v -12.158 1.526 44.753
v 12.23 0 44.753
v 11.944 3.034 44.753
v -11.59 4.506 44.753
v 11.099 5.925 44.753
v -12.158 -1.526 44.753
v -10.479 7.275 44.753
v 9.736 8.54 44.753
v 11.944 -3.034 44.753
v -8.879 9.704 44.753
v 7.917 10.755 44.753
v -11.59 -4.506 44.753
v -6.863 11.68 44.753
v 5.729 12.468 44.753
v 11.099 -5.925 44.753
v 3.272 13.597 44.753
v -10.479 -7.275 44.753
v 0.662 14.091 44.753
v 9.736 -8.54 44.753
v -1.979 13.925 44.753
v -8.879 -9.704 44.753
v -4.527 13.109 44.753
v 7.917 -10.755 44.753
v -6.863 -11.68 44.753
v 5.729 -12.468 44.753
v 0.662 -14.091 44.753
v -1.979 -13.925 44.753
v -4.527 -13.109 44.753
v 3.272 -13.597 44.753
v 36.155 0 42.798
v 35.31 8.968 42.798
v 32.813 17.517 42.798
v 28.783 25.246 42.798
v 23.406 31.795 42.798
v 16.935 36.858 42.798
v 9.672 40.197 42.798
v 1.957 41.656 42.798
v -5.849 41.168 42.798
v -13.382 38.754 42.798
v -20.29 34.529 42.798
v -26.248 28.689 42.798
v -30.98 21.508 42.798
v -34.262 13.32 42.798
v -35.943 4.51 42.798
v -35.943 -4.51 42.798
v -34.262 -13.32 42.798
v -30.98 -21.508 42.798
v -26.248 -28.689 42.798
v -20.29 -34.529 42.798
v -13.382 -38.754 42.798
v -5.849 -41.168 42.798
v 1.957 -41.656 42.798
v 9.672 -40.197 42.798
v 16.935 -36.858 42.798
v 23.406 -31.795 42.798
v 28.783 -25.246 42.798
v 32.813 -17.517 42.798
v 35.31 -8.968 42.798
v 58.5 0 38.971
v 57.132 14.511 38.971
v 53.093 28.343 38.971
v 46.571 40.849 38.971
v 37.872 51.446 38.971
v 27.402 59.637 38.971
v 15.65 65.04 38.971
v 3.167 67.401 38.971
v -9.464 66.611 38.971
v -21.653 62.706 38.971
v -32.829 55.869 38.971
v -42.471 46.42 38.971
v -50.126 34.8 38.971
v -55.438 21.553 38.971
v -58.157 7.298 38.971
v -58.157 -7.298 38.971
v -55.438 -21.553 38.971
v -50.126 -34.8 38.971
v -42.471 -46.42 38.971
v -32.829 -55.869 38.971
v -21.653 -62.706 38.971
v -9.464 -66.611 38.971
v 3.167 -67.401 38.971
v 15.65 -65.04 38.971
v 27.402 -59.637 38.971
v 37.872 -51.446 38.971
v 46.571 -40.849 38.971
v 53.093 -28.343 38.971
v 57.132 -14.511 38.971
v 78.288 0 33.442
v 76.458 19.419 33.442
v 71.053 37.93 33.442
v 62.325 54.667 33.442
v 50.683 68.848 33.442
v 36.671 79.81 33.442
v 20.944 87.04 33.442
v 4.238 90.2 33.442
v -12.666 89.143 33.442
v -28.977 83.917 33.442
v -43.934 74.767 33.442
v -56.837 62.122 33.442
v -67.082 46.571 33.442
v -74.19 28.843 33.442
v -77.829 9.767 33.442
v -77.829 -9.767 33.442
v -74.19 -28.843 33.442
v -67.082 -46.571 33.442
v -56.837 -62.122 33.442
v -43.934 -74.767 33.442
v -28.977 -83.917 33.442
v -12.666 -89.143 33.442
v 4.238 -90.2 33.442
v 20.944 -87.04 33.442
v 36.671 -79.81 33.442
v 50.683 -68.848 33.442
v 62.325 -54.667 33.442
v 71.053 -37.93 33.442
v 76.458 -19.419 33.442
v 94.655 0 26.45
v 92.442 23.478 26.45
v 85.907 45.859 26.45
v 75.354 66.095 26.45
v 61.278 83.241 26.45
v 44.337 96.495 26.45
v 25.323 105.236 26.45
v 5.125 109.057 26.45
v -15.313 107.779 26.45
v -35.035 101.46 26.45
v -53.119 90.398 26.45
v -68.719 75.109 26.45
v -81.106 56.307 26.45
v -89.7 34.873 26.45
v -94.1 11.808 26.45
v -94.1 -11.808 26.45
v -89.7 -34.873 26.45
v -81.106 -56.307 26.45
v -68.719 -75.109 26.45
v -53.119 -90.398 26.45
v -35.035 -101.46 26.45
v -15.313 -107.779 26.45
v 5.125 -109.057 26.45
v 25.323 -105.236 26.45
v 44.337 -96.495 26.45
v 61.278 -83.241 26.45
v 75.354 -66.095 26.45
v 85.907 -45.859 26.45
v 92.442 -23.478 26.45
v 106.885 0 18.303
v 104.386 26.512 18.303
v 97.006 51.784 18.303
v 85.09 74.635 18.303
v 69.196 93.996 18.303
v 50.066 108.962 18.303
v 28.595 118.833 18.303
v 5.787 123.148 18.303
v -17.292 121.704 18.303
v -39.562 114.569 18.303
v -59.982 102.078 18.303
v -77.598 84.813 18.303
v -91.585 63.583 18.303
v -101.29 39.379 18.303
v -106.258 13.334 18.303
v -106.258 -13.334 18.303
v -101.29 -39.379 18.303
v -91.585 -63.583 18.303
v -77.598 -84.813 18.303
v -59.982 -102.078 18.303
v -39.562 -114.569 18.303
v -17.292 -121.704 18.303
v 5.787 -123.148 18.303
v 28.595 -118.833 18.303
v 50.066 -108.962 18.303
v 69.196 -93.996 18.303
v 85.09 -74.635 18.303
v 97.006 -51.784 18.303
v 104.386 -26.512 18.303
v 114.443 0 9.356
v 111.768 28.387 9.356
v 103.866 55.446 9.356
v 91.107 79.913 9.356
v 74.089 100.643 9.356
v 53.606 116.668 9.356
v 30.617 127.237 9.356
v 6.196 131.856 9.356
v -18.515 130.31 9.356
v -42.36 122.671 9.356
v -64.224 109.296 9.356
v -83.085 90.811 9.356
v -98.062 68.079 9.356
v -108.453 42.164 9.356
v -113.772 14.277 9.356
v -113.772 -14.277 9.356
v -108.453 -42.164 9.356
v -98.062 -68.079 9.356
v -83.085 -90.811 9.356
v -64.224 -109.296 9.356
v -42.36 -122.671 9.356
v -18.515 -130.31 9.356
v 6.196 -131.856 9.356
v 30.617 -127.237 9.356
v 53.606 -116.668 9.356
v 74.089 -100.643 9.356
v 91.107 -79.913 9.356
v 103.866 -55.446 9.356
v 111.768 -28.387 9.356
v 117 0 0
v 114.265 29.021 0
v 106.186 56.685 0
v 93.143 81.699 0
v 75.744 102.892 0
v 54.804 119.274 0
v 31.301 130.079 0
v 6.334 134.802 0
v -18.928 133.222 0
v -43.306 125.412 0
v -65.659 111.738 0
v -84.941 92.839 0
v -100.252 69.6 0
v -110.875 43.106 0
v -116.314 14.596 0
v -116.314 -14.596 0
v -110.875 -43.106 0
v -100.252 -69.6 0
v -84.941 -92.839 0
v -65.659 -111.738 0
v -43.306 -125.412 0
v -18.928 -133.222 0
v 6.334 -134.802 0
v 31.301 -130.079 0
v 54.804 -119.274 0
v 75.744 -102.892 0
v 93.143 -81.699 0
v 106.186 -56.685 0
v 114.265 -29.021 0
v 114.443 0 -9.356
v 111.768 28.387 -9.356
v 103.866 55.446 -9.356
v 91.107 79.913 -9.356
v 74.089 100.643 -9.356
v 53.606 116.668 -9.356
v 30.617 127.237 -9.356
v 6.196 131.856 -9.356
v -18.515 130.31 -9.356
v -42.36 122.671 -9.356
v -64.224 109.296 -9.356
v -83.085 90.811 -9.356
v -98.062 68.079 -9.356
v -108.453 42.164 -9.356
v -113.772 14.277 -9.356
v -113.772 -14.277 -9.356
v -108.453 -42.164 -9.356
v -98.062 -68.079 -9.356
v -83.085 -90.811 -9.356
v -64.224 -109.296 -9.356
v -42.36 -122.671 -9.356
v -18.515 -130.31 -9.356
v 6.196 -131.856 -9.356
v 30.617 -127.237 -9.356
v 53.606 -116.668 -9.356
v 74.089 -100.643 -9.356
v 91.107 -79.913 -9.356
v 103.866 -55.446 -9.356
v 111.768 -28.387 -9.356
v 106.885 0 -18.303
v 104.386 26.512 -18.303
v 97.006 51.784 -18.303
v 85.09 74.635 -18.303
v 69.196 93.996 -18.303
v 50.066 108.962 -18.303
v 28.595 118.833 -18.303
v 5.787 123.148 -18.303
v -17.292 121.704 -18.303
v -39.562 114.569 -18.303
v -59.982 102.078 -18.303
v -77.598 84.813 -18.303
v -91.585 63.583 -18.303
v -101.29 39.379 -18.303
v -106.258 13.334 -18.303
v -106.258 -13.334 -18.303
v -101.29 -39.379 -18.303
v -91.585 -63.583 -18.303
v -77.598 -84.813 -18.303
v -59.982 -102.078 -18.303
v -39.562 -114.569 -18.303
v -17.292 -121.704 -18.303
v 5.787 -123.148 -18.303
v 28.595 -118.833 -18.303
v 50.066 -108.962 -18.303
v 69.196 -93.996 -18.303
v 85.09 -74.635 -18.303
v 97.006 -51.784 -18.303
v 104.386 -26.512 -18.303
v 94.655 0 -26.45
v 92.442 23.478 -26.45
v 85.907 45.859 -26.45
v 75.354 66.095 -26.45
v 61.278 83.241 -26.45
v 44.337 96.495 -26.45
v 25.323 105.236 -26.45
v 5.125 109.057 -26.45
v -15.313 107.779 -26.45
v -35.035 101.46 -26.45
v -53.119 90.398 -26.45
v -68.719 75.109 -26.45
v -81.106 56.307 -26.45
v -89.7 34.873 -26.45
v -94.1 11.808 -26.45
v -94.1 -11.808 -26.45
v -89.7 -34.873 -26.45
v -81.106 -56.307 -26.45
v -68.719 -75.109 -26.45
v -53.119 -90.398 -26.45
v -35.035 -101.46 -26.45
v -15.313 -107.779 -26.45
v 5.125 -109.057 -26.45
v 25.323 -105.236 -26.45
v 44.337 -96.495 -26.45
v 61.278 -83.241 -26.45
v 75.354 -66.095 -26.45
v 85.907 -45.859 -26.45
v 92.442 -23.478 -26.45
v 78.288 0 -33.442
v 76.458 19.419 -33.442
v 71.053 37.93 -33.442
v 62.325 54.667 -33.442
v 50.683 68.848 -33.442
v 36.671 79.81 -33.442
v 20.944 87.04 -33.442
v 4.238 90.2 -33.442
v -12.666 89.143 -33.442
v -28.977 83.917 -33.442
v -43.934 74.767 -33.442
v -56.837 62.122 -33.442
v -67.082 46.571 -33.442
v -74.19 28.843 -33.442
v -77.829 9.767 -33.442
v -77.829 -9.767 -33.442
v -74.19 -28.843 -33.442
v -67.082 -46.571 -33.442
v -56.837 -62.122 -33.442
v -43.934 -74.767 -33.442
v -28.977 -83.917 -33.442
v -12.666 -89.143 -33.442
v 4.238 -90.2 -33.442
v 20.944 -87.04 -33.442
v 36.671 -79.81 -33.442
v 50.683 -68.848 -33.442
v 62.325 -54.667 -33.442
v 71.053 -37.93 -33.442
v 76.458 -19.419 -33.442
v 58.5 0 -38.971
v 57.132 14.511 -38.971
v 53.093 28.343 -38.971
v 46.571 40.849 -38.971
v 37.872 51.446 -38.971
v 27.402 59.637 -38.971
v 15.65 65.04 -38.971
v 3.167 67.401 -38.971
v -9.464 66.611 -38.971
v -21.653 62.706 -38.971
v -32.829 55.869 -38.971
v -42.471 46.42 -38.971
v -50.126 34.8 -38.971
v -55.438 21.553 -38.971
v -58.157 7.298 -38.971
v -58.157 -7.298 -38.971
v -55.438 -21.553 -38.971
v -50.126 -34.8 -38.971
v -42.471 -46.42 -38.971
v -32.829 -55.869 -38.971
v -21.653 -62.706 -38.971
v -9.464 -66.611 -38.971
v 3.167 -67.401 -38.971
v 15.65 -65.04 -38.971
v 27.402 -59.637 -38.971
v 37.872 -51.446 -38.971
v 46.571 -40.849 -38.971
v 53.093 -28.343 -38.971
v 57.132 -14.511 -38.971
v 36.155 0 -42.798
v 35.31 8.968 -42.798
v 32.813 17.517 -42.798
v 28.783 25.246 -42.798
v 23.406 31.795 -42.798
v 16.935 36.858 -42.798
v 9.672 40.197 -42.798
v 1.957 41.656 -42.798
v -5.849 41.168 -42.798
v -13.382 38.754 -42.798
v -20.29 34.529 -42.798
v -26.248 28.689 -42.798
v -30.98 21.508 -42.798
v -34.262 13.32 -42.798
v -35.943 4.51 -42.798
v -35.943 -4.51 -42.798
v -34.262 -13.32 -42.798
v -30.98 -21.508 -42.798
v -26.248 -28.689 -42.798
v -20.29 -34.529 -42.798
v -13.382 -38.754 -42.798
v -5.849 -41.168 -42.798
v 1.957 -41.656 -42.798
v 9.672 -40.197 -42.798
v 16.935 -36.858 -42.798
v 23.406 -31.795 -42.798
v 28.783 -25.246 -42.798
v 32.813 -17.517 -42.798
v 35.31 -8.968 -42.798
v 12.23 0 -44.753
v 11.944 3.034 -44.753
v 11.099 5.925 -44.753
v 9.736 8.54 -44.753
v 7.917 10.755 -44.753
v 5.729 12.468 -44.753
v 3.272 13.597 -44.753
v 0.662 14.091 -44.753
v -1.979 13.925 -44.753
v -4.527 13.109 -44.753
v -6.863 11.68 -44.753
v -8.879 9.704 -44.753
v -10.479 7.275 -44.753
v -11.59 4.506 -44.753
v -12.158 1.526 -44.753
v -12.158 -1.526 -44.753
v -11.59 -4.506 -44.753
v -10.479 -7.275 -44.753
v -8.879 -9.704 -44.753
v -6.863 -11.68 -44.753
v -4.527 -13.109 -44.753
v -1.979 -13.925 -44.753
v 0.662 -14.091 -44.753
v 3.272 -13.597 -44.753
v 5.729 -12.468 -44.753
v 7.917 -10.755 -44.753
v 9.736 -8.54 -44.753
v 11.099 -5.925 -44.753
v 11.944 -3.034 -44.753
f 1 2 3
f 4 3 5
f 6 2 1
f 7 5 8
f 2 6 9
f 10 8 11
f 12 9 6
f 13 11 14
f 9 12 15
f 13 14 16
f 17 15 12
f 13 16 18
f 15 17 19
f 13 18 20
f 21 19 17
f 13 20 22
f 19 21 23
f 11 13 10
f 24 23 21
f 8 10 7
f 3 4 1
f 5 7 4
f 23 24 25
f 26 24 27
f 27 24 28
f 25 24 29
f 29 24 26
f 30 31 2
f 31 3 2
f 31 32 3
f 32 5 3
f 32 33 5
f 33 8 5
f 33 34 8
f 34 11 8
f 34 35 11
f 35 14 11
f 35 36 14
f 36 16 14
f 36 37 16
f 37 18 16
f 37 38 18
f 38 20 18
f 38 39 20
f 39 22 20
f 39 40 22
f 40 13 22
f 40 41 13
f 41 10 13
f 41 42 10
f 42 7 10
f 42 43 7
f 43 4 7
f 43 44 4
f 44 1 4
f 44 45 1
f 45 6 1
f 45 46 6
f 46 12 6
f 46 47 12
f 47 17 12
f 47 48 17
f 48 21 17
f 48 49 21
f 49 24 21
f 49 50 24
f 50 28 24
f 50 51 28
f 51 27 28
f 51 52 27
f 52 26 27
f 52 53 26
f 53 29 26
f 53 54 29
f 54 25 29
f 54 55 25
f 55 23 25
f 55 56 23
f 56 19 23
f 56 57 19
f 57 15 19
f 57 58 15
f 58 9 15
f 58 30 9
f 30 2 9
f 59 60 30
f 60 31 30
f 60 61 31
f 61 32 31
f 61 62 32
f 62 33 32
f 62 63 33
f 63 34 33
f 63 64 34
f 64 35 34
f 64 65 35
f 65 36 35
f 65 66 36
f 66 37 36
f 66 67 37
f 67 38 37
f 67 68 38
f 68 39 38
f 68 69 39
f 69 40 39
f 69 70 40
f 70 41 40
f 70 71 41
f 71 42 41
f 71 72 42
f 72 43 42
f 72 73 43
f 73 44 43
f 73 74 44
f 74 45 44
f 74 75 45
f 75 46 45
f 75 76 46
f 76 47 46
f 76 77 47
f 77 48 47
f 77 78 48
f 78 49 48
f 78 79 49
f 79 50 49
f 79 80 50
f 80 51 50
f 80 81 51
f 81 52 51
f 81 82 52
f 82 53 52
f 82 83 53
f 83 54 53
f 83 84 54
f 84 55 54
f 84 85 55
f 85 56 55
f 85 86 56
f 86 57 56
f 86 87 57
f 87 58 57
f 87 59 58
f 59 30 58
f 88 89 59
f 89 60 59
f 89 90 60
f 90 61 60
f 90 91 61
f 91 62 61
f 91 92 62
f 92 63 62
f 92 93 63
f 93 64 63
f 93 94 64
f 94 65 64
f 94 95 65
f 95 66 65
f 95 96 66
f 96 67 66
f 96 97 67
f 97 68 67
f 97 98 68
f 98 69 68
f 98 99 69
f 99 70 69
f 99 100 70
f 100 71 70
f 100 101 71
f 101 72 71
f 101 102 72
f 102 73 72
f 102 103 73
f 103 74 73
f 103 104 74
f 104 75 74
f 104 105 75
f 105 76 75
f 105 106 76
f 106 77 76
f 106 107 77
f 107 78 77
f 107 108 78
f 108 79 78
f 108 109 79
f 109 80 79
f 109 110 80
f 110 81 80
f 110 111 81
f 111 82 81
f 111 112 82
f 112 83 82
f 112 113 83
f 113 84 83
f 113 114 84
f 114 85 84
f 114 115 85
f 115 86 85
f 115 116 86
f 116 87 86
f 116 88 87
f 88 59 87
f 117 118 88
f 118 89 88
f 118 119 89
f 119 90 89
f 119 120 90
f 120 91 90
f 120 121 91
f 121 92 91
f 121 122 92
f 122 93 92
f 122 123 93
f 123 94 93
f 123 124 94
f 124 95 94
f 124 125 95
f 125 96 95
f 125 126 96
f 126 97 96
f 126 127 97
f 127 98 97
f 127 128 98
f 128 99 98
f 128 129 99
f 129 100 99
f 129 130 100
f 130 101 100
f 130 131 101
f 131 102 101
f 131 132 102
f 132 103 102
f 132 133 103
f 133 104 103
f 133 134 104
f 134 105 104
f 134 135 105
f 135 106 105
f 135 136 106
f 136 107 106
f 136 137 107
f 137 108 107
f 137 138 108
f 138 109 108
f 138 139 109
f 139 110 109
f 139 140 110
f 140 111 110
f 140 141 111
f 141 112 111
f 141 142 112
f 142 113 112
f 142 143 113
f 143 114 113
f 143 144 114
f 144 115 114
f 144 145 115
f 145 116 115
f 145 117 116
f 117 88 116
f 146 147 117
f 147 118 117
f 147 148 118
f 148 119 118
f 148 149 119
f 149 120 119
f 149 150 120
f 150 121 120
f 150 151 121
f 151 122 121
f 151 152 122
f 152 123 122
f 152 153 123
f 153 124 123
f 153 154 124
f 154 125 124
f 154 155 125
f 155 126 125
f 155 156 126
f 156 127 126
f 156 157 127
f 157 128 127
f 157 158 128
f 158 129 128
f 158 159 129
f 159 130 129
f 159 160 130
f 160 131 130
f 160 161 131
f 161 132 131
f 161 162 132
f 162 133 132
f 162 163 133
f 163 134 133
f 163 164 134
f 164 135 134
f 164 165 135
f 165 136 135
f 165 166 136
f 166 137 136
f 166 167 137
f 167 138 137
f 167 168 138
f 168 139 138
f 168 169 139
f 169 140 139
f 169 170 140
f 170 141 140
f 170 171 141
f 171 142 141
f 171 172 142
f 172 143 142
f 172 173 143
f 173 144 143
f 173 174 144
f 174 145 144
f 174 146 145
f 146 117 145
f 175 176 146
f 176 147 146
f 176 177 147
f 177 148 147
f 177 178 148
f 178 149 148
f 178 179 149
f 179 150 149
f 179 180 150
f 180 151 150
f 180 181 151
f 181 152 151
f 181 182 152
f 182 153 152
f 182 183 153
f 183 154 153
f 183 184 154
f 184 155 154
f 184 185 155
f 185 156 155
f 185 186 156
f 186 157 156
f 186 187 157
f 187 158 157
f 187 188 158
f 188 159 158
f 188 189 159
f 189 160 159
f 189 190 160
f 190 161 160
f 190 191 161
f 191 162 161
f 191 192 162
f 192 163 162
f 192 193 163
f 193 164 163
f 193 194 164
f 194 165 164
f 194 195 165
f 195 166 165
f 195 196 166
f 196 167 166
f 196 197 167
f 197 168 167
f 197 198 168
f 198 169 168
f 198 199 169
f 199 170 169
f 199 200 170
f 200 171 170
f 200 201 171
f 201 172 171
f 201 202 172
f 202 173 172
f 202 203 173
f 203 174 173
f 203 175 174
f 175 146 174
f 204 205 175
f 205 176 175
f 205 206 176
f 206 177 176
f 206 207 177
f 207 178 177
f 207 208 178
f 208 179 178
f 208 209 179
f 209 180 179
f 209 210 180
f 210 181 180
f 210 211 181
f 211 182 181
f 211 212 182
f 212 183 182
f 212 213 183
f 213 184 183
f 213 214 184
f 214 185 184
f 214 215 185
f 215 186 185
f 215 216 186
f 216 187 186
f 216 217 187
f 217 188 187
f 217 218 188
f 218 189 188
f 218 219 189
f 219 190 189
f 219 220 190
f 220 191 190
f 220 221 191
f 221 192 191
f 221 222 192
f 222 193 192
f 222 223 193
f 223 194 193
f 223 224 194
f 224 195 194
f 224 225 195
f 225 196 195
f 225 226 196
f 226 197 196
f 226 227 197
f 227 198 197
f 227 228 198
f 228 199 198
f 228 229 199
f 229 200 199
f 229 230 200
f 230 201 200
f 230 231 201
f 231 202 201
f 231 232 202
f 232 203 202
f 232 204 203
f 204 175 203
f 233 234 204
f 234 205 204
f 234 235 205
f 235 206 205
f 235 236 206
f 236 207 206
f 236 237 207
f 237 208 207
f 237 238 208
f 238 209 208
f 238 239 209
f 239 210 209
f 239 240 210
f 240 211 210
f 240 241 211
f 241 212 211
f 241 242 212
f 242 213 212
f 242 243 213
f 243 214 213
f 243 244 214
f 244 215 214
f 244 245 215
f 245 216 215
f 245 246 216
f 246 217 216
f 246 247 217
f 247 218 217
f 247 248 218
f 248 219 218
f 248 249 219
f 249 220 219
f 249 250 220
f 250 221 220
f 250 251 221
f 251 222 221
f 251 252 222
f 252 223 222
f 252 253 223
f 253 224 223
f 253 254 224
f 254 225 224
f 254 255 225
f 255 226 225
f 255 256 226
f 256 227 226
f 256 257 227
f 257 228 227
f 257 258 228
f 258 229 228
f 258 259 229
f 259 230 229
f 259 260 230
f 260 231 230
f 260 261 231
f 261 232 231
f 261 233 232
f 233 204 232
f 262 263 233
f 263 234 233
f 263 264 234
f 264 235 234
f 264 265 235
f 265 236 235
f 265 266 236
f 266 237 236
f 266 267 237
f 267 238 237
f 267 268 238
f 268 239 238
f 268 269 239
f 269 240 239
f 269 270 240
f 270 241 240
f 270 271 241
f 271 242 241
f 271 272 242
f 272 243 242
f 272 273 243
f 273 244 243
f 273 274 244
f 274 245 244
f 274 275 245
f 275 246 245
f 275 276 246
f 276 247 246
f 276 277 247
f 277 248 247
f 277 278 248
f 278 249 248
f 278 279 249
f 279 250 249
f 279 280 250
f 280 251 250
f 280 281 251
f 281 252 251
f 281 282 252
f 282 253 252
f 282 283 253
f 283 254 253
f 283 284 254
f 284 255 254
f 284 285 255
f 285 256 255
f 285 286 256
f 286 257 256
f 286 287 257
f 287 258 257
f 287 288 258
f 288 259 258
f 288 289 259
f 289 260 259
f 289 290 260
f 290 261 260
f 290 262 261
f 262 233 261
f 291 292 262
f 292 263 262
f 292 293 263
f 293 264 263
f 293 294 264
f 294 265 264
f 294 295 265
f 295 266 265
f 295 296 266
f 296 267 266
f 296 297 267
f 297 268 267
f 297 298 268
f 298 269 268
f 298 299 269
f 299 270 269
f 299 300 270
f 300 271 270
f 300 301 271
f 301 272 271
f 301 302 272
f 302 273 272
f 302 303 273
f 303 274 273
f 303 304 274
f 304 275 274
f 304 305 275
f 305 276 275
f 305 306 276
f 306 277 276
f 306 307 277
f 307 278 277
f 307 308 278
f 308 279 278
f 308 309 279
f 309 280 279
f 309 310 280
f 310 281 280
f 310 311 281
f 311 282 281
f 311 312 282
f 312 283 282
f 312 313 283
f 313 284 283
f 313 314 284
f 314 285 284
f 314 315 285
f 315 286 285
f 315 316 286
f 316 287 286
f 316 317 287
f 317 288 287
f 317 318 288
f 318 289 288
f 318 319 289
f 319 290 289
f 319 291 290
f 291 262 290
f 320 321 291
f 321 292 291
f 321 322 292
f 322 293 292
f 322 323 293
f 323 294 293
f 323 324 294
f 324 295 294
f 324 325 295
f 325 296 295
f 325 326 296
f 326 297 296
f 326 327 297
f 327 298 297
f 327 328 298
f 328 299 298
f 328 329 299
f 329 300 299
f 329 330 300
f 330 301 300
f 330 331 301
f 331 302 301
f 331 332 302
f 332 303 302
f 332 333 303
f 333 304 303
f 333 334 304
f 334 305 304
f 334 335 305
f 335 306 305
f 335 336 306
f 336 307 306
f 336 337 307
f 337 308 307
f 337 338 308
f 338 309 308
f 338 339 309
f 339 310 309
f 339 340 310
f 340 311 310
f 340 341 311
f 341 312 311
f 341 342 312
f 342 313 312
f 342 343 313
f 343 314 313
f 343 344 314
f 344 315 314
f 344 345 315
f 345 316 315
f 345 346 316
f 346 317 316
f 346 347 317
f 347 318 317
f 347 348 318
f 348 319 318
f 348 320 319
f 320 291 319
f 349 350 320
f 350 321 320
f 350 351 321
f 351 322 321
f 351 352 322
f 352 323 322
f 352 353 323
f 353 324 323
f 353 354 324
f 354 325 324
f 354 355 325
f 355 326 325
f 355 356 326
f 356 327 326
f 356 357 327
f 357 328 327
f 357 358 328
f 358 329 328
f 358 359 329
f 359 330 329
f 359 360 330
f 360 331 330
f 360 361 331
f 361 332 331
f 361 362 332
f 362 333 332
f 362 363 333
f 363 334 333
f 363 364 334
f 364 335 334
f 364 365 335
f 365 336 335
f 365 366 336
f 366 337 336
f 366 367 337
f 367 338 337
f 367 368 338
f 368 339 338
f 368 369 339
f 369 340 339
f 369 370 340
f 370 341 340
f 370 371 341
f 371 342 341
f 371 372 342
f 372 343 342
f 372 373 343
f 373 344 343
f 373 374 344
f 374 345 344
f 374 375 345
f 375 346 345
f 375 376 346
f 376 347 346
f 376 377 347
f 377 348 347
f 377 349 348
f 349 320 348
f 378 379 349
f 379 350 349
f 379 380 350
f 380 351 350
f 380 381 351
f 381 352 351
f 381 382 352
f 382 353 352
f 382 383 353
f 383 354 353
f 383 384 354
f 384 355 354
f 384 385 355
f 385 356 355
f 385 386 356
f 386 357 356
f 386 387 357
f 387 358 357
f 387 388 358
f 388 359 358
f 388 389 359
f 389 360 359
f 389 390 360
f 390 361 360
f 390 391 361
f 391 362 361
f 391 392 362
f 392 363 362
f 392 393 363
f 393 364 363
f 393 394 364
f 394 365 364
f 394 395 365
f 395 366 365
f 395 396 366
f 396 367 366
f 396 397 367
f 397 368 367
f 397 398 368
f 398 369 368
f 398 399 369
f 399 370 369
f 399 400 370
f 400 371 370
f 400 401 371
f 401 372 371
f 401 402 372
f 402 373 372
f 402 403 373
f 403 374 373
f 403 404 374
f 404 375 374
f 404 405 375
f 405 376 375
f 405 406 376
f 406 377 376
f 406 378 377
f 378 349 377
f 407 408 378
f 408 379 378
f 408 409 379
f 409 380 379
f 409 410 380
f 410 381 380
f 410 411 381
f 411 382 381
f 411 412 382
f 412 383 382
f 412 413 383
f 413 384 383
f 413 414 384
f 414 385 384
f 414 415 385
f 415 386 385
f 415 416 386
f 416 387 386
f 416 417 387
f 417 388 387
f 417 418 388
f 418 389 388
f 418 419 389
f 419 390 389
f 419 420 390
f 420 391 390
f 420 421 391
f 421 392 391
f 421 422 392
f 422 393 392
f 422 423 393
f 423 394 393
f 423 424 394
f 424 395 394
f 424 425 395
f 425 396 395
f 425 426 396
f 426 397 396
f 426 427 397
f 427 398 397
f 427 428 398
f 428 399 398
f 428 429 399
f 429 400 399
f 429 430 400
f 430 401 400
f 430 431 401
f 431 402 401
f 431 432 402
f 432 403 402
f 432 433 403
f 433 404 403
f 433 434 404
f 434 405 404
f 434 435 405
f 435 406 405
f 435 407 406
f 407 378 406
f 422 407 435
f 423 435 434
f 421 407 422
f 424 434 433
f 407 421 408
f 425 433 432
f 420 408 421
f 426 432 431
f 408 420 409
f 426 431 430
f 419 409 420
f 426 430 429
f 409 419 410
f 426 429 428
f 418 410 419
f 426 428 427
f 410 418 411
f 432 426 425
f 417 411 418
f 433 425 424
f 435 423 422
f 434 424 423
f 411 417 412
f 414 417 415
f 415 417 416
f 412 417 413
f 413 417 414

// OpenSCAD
// Generated by SolidPython 1.0.1 on 2020-07-29 00:46:51


scale(v = [13, 15, 5]) {
	sphere(r = 9);
}
/***********************************************
*********      SolidPython code:      **********
************************************************
 
# import packages: SolidPython
from solid import *
from solid.utils import *
from itertools import chain, combinations, permutations


class Resize:

    def __init__(self, scad_file):
        self.scad_file = scad_file
        #self.scad_file = import_scad(scad_file)
        # cone/cylinder param:
        self.r1 = 0
        self.r2 = 0
        self.h = 0
        # rectangular prism param:
        self.w = 0
        self.l = 0
        # ellipse param:
        self.r = 0

    # import OpenScad code (file name corresponds to shape)


    # classify shape + parameters
    def assign(self, param1, param2, param3):
        if self.scad_file == 'cone.scad':
            self.r1 = param1
            self.r2 = param2
            self.h = param3
        elif self.scad_file == 'cylinder.scad':
            self.r1 = param1
            self.r2 = param2
            self.h = param3
        elif self.scad_file == 'rectangularPrism.scad':
            self.h = param1
            self.l = param2
            self.w = param3
        else:
            self.r = param1
            self.h = param2

    # resize parameters
    def iterate(self):
        x = range(3, 20, 2)
        i = 1
        if self.scad_file == 'cone.scad':
            tempList = list(permutations(x, 2))
            for temp in tempList:
                param1 = temp[0]
                param2 = temp[1]
                filepath = 'produced_scad_files/' + 'cone' + str(param1) + '_' + str(param2) + '_' + '.scad'
                scad_render_to_file(cylinder(h=param1, r1=param2, r2=0), filepath)

        elif self.scad_file == 'cylinder.scad':
            tempList = list(permutations(x, 3))
            for temp in tempList:
                param1 = temp[0]
                param2 = temp[1]
                filepath = 'produced_scad_files/' + 'cylinder' + str(param1) + '_' + str(param2) + '_' + '.scad'
                scad_render_to_file(cylinder(h=param1, r1=param2, r2=param2), filepath)

        elif self.scad_file == 'rectangularPrism.scad':
            tempList = list(permutations(x, 3))
            for temp in tempList:
                param1 = temp[0]
                param2 = temp[1]
                param3 = temp[2]
                filepath = 'produced_scad_files/' + 'rectangularPrism' + str(param1) + '_' + str(param2) + '_' + str(
                    param3) + '.scad'
                scad_render_to_file(cube(size=(param1, param2, param3)), filepath)

        elif self.scad_file == 'ellipse.scad':
            tempList = list(permutations(x, 4))
            for temp in tempList:
                param1 = temp[0]
                param2 = temp[1]
                param3 = temp[2]
                param4 = temp[3]
                filepath = 'produced_scad_files/' + 'ellipse' + str(param1) + '_' + str(param2) + '_' + str(param3) + '_' + str(param4) + '.scad'
                scad_render_to_file(scale([param1, param2, param3])(sphere(r=param4)), filepath)

    def render_to_scadfile(self):
        scad_render_to_file(scad, 'example.scad') 
 
************************************************/
